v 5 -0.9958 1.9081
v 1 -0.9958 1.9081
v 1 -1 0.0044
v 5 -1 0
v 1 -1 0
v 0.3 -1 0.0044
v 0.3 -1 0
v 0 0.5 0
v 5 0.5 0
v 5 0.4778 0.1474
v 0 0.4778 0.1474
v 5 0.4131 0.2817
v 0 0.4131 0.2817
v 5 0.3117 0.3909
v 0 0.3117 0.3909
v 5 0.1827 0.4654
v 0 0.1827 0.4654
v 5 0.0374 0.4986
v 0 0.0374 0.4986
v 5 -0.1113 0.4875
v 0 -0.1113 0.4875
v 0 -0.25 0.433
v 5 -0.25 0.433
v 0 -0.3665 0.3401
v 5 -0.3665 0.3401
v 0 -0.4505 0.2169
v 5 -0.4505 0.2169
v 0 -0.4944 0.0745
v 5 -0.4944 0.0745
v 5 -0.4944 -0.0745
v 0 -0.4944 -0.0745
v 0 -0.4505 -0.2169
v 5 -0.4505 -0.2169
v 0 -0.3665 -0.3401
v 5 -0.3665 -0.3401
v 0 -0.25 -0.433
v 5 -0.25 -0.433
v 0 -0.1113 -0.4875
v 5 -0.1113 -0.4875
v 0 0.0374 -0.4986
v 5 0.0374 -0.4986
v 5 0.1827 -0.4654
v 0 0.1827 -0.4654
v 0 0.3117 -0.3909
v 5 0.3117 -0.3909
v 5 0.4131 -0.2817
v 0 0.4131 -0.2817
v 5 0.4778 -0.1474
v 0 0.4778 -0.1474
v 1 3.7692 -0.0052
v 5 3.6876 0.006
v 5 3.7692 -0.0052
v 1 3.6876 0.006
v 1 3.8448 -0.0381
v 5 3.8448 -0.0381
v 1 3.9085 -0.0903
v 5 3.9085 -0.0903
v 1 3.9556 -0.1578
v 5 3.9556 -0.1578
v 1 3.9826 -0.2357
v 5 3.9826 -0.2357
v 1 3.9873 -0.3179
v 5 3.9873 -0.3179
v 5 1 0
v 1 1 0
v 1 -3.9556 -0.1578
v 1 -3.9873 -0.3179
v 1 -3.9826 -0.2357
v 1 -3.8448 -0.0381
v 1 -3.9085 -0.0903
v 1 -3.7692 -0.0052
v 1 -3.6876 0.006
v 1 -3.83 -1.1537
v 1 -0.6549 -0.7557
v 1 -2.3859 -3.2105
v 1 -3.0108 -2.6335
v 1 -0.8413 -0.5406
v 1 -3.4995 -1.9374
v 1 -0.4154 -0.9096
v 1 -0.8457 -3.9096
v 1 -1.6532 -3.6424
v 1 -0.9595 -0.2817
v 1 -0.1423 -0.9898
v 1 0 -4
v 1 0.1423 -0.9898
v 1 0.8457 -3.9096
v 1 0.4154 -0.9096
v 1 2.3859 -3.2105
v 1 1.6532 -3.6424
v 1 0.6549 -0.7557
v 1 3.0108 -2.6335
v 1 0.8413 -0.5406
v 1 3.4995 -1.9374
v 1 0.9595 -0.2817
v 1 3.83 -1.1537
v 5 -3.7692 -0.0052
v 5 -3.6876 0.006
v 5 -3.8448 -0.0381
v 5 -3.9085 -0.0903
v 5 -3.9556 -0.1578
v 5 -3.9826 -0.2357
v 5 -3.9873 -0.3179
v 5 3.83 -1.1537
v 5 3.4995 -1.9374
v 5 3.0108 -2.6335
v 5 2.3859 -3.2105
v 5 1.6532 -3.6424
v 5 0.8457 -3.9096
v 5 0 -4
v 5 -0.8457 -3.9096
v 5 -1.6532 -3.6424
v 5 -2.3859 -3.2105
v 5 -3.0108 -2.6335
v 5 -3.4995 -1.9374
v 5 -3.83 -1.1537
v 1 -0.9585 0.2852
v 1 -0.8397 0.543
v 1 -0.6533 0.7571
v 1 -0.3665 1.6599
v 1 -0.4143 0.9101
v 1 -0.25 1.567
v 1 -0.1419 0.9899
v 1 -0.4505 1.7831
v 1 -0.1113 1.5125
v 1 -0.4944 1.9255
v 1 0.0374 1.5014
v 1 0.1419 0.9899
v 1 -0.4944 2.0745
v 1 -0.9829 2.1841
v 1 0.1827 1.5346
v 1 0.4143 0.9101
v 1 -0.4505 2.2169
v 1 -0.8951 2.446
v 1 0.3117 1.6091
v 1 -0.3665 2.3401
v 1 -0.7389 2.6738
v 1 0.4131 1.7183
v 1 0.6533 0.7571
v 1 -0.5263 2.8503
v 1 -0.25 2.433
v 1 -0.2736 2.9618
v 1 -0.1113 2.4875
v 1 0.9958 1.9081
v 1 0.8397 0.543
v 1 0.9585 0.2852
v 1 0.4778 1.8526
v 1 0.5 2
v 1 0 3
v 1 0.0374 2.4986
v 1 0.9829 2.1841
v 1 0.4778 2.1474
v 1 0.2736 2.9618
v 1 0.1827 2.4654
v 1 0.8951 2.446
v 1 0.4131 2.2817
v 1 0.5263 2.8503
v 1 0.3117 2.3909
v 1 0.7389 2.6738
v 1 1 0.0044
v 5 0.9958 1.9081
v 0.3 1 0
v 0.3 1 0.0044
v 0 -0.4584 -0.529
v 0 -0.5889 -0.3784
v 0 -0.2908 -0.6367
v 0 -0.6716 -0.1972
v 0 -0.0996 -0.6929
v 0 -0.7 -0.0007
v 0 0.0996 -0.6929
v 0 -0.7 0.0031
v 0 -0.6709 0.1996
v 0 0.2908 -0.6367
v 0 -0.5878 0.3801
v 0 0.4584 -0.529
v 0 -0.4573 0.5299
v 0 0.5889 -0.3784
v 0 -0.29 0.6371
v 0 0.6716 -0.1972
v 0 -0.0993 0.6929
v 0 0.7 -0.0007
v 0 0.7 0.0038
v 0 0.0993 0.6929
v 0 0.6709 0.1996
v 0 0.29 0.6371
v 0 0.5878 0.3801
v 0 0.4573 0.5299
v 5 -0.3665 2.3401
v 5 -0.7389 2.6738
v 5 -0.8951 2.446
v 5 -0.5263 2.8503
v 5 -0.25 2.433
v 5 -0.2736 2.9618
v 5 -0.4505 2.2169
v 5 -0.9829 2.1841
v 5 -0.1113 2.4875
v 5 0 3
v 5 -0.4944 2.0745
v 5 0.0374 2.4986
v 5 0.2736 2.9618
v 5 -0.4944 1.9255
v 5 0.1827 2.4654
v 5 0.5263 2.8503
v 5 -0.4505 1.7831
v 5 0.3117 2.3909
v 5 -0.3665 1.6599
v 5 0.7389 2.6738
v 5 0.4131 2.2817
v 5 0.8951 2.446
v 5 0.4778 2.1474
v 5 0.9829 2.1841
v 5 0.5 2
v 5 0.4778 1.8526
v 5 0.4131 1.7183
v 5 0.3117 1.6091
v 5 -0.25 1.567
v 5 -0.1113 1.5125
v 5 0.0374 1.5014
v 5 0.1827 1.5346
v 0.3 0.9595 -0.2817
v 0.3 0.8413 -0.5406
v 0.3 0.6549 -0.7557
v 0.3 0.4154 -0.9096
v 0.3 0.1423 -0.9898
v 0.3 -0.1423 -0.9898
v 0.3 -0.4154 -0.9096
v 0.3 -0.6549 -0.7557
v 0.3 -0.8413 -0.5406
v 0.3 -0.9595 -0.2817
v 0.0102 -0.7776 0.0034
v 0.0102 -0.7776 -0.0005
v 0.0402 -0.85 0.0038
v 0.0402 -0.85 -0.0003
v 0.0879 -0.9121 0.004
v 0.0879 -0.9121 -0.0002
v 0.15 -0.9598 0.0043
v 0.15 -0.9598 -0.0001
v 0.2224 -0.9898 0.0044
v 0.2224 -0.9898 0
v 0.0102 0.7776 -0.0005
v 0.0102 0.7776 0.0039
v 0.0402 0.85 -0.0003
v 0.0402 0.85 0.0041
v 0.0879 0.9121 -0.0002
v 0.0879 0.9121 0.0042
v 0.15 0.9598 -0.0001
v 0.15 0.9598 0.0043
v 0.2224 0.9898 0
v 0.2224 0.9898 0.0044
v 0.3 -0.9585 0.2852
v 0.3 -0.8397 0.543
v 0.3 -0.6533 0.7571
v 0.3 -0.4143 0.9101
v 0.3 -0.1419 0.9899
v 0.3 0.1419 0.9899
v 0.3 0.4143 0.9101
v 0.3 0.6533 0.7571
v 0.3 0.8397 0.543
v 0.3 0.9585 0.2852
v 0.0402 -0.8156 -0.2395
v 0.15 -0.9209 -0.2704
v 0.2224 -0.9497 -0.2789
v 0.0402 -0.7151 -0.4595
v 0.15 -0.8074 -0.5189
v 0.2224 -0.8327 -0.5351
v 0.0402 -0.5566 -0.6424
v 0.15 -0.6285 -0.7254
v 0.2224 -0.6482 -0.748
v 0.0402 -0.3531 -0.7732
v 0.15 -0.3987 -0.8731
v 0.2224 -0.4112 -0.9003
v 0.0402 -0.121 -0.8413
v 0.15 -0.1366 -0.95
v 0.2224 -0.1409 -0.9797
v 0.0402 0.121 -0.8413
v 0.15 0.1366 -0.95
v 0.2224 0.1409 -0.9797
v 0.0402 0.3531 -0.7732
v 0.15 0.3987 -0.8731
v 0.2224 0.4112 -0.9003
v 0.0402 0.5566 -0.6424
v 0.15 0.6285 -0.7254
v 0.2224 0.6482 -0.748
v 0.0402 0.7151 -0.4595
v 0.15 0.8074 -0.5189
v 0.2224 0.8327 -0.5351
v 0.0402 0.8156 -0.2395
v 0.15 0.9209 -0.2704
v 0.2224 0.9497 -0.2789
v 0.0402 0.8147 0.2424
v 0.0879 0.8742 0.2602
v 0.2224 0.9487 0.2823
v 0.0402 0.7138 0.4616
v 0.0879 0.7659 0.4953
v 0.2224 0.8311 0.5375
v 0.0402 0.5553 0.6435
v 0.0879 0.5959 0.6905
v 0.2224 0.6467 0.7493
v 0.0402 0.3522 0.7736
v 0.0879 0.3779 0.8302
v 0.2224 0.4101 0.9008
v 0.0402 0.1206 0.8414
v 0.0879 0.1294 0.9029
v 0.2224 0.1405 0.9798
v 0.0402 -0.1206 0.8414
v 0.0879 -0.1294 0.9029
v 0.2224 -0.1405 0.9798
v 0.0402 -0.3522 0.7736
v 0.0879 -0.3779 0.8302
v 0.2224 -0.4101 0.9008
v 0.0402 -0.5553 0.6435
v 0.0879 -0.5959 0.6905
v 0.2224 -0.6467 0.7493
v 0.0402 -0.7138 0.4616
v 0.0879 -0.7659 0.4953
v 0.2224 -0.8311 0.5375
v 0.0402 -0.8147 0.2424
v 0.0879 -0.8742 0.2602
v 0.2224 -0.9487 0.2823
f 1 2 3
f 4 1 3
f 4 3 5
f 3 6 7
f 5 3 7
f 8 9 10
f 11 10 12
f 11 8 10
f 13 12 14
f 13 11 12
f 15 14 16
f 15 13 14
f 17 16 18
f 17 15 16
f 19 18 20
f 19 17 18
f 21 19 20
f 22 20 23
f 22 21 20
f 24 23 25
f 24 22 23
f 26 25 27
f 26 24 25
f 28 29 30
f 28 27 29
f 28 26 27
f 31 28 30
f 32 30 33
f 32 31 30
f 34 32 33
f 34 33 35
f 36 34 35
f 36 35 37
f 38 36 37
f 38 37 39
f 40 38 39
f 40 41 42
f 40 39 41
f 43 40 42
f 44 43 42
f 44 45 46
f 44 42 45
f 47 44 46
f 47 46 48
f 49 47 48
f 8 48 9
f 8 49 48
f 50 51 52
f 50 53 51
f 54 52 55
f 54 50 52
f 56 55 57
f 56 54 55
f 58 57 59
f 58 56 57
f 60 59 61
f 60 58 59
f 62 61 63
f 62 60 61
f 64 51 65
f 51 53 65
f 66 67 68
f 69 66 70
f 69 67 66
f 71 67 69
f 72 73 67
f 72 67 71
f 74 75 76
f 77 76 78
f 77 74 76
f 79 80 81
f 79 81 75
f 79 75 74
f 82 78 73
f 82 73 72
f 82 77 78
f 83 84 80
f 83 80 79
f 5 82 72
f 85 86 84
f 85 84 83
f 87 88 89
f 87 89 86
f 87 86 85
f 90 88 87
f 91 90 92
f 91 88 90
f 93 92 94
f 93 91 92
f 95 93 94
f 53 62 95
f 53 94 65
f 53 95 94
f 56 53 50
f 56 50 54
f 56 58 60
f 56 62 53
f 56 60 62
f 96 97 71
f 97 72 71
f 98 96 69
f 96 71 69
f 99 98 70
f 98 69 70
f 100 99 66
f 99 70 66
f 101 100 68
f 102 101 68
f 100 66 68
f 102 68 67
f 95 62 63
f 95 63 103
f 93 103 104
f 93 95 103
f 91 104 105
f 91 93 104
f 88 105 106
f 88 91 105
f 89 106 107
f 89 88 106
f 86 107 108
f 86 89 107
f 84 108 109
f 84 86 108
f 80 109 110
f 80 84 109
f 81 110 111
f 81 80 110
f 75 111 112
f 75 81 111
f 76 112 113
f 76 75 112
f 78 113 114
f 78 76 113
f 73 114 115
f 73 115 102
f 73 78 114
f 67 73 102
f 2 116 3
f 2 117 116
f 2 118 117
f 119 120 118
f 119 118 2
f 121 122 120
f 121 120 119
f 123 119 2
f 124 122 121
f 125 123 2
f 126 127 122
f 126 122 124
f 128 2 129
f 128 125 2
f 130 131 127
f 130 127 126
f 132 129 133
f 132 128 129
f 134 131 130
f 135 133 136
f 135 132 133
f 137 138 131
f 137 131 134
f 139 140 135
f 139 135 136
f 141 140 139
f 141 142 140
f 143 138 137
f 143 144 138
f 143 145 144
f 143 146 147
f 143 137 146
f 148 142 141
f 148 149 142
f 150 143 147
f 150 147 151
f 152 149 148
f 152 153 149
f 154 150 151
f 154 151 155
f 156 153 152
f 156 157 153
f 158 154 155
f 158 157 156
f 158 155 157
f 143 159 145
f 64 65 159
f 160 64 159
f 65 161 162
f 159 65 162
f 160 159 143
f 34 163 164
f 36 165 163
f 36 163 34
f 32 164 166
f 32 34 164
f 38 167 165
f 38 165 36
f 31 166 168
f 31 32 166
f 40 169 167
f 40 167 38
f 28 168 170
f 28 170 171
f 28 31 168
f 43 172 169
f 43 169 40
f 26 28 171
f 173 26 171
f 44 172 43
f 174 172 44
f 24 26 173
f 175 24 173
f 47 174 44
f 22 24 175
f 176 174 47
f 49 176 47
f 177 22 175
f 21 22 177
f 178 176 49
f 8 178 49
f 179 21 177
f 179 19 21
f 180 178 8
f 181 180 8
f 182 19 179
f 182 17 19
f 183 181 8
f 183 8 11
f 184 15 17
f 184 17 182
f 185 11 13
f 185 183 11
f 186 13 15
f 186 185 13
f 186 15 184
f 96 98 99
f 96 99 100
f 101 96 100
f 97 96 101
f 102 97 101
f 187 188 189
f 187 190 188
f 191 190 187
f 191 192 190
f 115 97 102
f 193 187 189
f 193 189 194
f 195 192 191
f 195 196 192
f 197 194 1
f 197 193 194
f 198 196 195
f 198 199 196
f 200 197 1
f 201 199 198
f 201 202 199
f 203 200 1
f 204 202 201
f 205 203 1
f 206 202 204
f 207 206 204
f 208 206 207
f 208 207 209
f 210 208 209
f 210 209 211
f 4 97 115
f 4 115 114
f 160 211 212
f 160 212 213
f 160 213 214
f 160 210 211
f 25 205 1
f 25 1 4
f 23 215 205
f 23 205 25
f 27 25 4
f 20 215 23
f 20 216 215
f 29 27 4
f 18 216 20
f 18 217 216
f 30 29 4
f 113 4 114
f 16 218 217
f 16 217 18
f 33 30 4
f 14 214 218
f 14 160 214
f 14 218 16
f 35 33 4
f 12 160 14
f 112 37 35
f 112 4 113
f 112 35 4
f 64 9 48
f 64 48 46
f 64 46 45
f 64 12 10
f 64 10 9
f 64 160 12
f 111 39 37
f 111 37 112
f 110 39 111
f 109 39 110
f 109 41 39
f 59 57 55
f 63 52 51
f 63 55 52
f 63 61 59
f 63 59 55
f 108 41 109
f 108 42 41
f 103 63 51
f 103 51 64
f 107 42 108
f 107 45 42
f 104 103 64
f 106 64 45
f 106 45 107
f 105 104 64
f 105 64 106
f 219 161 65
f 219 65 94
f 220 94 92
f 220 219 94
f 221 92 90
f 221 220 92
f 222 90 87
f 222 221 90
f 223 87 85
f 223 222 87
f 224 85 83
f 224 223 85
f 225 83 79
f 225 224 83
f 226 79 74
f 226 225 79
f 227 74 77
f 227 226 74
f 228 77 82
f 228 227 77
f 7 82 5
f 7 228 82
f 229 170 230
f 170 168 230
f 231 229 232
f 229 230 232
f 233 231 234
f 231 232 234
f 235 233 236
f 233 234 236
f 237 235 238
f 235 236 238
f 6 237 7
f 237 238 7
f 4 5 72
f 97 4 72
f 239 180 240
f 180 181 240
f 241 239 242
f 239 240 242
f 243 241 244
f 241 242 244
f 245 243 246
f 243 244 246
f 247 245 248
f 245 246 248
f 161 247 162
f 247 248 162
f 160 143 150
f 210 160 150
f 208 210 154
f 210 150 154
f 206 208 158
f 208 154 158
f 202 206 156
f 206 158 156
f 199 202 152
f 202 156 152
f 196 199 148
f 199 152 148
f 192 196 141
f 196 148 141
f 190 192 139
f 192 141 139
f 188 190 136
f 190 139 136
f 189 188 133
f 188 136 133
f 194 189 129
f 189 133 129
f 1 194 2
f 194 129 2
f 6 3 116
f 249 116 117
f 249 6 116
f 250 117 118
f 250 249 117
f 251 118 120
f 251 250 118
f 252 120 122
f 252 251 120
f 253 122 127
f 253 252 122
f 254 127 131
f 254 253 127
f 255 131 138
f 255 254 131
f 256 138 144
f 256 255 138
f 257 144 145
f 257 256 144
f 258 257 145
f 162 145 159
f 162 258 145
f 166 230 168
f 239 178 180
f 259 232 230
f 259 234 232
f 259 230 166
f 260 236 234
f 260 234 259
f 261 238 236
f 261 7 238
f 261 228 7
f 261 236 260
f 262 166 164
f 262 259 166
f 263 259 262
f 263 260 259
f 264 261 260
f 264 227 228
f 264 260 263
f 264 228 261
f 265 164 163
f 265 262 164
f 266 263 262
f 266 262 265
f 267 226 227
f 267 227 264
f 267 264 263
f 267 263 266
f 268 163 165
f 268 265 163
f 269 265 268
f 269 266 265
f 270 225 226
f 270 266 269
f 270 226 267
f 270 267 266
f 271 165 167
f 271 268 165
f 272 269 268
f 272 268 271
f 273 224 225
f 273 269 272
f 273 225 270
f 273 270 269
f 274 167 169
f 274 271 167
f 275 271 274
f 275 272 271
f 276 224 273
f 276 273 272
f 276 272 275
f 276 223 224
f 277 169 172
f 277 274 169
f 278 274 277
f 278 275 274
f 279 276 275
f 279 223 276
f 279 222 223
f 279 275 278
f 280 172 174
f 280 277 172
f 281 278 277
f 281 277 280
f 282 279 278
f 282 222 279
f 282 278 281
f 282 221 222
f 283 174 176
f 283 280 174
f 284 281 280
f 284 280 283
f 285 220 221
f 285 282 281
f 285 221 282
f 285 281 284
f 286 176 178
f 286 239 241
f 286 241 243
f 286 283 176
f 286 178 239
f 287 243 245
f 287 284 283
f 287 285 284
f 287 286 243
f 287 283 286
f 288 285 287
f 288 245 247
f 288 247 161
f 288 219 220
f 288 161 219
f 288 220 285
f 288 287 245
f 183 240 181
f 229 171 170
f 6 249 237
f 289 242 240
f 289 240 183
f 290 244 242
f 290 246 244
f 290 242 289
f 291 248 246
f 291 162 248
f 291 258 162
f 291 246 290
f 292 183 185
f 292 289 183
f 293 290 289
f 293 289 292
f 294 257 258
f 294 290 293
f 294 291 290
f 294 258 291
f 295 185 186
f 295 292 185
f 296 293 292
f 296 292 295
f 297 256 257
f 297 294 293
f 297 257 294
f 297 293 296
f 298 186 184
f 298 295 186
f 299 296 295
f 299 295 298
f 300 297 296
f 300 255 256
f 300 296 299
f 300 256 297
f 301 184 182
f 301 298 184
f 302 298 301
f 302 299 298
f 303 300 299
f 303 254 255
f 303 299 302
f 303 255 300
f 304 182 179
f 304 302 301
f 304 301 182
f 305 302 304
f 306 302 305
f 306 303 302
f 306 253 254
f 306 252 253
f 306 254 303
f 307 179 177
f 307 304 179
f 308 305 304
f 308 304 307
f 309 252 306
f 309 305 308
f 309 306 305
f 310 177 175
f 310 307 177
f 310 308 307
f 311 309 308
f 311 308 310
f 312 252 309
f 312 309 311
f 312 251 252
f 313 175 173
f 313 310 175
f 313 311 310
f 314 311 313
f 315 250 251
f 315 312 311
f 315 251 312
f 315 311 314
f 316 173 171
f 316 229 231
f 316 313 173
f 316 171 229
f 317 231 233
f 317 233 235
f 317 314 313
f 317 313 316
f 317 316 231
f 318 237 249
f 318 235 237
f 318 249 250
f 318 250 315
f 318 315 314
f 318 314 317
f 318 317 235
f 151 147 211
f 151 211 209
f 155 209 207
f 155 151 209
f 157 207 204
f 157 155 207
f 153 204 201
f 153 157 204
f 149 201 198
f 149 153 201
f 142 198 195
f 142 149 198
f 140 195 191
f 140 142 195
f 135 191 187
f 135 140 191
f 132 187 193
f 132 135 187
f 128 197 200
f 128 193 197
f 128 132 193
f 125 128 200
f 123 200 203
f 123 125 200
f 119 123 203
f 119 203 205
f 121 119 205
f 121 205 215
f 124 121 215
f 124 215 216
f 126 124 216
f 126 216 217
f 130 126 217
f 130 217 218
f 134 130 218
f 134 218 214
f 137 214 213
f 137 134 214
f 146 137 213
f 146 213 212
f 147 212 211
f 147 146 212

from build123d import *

# Parameters (mm, degrees)
F2_R     = 0.5
F3_DEPTH = 25
F4_R     = 0.3


with BuildPart() as f1:
    # F0 (on Front) → F1 (revolve)
    with BuildSketch(Plane.XZ):
        Polygon((0, 1), (0, 0), (5, 0), (5, 4), (1, 4), (1, 1), align=None)
    revolve(axis=Axis((2.5, 0, 0), (-1, 0, 0)))

    # F2 (on Right) → F3 (intersect)
    with BuildSketch(Plane.YZ):
        with BuildLine():
            Line((4.000914, 0.006655), (1, 0))
            Line((1, 0), (0.995769, 1.908105))
            ThreePointArc((0.995769, 1.908105), (0, 3), (-0.995769, 1.908105))
            Line((-0.995769, 1.908105), (-1, 0))
            Line((-1, 0), (-4.000914, 0.006655))
            ThreePointArc((-4.000914, 0.006655), (0, -4.000919), (4.000914, 0.006655))
        make_face()
        Circle(F2_R, mode=Mode.SUBTRACT)
        with Locations((0, 2)):
            Circle(F2_R, mode=Mode.SUBTRACT)
    extrude(amount=F3_DEPTH, mode=Mode.INTERSECT)

    # F4
    f4_edges = [f1.edges().sort_by_distance(p)[0] for p in [
        (3, -3.999994, 0.006653),
        (3, 3.999994, 0.006653),
        (0, 0.999995, 0.002218),
    ]]
    fillet(f4_edges, radius=F4_R)


solid = f1.part
